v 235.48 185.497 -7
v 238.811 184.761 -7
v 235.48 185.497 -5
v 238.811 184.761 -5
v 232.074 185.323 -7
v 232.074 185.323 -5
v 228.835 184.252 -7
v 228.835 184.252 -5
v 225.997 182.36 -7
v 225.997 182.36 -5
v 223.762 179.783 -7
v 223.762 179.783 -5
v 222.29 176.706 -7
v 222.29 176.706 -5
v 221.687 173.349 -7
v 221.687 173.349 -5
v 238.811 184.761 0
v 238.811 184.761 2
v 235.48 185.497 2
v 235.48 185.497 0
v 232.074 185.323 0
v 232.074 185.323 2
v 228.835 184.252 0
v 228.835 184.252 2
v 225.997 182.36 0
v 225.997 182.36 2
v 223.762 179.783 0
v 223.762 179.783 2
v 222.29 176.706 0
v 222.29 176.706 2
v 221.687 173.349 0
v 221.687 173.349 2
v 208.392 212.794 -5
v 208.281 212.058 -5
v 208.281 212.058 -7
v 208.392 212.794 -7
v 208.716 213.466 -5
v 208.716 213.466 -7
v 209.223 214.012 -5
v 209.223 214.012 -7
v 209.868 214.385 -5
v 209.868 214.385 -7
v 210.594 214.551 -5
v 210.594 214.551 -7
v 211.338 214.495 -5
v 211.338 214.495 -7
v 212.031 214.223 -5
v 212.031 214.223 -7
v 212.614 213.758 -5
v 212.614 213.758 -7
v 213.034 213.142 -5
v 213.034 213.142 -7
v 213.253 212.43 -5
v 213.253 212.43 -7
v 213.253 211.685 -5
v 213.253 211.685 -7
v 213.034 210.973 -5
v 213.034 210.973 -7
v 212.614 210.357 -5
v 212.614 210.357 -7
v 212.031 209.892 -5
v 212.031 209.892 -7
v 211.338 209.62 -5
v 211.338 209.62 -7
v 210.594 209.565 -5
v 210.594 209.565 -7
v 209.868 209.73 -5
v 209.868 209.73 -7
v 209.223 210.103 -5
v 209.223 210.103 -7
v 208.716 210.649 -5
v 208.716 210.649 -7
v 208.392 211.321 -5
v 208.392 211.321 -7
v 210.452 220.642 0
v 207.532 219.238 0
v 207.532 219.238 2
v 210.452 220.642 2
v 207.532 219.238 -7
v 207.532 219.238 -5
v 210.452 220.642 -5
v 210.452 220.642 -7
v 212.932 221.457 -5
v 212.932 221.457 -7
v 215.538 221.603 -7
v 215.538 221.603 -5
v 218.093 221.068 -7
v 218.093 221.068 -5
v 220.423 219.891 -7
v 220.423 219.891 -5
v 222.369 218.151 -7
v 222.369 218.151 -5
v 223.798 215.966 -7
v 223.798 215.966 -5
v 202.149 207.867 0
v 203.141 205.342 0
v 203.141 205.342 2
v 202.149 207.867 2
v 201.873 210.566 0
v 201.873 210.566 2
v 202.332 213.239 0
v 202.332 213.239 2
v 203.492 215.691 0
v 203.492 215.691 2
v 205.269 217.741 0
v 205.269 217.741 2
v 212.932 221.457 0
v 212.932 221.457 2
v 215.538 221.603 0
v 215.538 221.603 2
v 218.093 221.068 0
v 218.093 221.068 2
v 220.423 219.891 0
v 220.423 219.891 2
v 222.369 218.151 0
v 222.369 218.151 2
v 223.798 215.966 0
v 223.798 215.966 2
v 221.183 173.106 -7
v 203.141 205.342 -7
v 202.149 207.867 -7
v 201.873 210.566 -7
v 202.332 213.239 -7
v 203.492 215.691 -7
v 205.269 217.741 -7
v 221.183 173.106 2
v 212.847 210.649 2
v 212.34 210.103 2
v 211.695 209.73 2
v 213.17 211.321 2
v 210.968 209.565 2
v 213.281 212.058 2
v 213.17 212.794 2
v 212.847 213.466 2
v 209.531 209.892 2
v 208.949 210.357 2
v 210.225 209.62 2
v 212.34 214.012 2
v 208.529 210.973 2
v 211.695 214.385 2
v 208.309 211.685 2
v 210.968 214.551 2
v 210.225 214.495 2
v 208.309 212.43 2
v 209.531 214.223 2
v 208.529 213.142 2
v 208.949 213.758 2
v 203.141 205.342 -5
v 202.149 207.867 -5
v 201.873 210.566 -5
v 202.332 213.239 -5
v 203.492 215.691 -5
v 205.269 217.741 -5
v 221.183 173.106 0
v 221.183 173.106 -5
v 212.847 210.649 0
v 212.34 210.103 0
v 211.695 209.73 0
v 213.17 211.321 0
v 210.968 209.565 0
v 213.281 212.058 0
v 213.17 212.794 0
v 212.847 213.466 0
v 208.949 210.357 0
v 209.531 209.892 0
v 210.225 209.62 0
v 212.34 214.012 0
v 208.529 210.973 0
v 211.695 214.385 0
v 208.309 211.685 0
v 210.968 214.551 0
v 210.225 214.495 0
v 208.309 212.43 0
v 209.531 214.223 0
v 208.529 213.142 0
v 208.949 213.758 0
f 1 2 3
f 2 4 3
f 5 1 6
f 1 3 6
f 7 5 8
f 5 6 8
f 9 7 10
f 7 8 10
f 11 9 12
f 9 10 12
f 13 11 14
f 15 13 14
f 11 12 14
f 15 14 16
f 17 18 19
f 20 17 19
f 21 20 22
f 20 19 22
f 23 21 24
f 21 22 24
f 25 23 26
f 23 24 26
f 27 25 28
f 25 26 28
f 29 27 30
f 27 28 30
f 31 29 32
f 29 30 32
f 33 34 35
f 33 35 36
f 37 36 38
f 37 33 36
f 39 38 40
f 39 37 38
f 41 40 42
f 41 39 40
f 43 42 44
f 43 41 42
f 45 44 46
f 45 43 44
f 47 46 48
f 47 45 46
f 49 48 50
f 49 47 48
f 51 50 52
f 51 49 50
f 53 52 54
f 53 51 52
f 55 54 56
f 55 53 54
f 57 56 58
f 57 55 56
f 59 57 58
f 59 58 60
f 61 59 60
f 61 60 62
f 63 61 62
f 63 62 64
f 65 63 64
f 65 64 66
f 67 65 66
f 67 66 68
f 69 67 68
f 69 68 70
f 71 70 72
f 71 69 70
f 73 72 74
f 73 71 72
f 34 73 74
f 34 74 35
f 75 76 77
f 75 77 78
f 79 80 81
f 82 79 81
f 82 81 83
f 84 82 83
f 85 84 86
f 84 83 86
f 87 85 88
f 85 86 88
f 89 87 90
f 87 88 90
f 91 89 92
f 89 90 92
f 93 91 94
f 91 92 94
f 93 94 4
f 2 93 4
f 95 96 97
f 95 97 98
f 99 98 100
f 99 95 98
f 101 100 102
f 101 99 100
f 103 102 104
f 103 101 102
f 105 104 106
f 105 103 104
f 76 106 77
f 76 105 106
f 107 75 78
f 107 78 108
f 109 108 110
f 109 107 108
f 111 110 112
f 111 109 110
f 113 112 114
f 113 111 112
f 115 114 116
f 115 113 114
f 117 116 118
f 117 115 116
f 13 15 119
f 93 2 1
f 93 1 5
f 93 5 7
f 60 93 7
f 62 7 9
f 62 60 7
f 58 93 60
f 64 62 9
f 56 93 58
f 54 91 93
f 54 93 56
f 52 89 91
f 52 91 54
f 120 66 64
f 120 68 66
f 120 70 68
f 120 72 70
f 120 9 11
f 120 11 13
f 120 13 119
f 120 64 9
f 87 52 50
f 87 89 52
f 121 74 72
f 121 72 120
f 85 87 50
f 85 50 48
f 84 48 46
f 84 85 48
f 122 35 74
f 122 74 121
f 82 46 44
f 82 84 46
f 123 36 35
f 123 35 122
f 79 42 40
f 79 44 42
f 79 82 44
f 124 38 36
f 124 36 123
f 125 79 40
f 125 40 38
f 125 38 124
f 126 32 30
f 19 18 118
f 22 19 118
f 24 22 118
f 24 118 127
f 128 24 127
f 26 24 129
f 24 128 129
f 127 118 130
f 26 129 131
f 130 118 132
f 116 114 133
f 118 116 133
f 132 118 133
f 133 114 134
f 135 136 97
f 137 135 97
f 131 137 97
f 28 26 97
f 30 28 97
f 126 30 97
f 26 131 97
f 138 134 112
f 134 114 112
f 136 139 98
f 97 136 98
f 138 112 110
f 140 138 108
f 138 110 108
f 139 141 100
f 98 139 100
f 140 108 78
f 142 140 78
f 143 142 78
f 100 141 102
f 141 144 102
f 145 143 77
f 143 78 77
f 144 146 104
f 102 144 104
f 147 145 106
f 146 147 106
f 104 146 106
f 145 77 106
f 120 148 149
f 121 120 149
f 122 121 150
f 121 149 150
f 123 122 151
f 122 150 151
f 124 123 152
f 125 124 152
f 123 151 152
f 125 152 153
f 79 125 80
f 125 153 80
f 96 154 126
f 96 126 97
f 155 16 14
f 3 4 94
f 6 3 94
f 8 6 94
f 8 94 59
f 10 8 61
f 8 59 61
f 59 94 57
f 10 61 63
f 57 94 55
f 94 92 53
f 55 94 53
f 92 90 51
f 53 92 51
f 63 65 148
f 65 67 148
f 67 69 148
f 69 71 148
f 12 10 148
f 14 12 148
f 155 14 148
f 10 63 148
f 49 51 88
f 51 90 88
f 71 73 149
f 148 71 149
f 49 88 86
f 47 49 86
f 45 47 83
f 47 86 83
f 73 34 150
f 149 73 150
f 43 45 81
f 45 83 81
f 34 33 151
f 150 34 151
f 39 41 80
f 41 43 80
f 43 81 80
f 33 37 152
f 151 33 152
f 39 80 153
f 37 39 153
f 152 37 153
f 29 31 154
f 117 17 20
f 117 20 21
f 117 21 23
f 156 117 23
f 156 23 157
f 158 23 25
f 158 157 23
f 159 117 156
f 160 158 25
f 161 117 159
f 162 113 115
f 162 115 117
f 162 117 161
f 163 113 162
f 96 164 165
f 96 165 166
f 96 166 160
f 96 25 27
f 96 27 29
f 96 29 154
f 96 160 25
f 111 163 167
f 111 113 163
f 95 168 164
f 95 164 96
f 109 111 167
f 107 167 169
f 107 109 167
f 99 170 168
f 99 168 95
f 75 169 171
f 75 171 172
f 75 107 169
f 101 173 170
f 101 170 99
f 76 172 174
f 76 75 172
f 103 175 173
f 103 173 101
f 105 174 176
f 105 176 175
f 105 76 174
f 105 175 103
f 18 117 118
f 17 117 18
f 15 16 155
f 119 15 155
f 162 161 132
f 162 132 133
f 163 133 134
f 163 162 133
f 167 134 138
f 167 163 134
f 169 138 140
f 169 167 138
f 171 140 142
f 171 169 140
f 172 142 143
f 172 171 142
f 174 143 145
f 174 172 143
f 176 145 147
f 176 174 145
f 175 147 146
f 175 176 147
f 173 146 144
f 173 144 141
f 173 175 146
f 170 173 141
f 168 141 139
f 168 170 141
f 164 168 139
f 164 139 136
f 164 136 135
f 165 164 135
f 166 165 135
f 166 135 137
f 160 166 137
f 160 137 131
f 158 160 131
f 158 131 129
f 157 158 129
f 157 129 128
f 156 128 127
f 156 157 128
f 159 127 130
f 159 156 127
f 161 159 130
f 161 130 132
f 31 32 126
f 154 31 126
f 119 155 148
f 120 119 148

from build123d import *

# Parameters (mm, degrees)
SZKIC1_R                    = 2.5
DODANIE_WYCI_GNI_CIE1_DEPTH = 2
SZKIC2_R                    = 2.5
DODANIE_WYCI_GNI_CIE2_DEPTH = 2
SZKIC3_R                    = 12.745847425
WYTNIJ_WYCI_GNI_CIE1_DEPTH  = 12


with BuildPart() as part:
    # Szkic1 → Dodanie-wyciągnięcie1 (new body)
    with BuildSketch(Plane.XY):
        with BuildLine():
            Line((207.531644372, 219.237526191), (210.451686214, 220.642336446))
            ThreePointArc((210.451686214, 220.642336446), (218.093481617, 221.068489918), (223.798382977, 215.966260579))
            Line((223.798382977, 215.966260579), (240.051018031, 182.183495797))
            Line((240.051018031, 182.183495797), (221.183345822, 173.106400043))
            Line((221.183345822, 173.106400043), (203.140807269, 205.342048464))
            ThreePointArc((203.140807269, 205.342048464), (202.33167839, 213.239195372), (207.531644372, 219.237526191))
        make_face()
        with Locations((210.781303051, 212.057553235)):
            Circle(SZKIC1_R, mode=Mode.SUBTRACT)
    extrude(amount=DODANIE_WYCI_GNI_CIE1_DEPTH)


with BuildPart() as body_2:
    # Szkic2 → Dodanie-wyciągnięcie2 (new body)
    with BuildSketch(Plane(origin=(0, 0, -5), x_dir=(-1, 0, 0), z_dir=(0, 0, -1))):
        with BuildLine():
            Line((-240.051018031, 182.183495797), (-221.183345822, 173.106400043))
            Line((-221.183345822, 173.106400043), (-203.140807269, 205.342048464))
            ThreePointArc((-203.140807269, 205.342048464), (-202.33167839, 213.239195372), (-207.531644372, 219.237526191))
            Line((-207.531644372, 219.237526191), (-210.451686214, 220.642336446))
            ThreePointArc((-210.451686214, 220.642336446), (-218.093481617, 221.068489918), (-223.798382977, 215.966260579))
            Line((-223.798382977, 215.966260579), (-240.051018031, 182.183495797))
        make_face()
        with Locations((-210.781303051, 212.057553235)):
            Circle(SZKIC2_R, mode=Mode.SUBTRACT)
    extrude(amount=DODANIE_WYCI_GNI_CIE2_DEPTH)


with BuildPart() as wytnij_wyci_gni_cie1_tool:
    # Szkic3 → Wytnij-wyciągnięcie1 (new body)
    with BuildSketch(Plane.XY.offset(2)):
        with Locations((234.421204702, 172.795325307)):
            Circle(SZKIC3_R)
    extrude(amount=-WYTNIJ_WYCI_GNI_CIE1_DEPTH)


with BuildPart() as part_1:
    add(part.part)

    # Wytnij-wyciągnięcie1: cut by wytnij_wyci_gni_cie1_tool
    add(wytnij_wyci_gni_cie1_tool.part, mode=Mode.SUBTRACT)


with BuildPart() as body_2_1:
    add(body_2.part)

    # Wytnij-wyciągnięcie1: cut by wytnij_wyci_gni_cie1_tool
    add(wytnij_wyci_gni_cie1_tool.part, mode=Mode.SUBTRACT)


solid = Compound([part_1.part, body_2_1.part])
